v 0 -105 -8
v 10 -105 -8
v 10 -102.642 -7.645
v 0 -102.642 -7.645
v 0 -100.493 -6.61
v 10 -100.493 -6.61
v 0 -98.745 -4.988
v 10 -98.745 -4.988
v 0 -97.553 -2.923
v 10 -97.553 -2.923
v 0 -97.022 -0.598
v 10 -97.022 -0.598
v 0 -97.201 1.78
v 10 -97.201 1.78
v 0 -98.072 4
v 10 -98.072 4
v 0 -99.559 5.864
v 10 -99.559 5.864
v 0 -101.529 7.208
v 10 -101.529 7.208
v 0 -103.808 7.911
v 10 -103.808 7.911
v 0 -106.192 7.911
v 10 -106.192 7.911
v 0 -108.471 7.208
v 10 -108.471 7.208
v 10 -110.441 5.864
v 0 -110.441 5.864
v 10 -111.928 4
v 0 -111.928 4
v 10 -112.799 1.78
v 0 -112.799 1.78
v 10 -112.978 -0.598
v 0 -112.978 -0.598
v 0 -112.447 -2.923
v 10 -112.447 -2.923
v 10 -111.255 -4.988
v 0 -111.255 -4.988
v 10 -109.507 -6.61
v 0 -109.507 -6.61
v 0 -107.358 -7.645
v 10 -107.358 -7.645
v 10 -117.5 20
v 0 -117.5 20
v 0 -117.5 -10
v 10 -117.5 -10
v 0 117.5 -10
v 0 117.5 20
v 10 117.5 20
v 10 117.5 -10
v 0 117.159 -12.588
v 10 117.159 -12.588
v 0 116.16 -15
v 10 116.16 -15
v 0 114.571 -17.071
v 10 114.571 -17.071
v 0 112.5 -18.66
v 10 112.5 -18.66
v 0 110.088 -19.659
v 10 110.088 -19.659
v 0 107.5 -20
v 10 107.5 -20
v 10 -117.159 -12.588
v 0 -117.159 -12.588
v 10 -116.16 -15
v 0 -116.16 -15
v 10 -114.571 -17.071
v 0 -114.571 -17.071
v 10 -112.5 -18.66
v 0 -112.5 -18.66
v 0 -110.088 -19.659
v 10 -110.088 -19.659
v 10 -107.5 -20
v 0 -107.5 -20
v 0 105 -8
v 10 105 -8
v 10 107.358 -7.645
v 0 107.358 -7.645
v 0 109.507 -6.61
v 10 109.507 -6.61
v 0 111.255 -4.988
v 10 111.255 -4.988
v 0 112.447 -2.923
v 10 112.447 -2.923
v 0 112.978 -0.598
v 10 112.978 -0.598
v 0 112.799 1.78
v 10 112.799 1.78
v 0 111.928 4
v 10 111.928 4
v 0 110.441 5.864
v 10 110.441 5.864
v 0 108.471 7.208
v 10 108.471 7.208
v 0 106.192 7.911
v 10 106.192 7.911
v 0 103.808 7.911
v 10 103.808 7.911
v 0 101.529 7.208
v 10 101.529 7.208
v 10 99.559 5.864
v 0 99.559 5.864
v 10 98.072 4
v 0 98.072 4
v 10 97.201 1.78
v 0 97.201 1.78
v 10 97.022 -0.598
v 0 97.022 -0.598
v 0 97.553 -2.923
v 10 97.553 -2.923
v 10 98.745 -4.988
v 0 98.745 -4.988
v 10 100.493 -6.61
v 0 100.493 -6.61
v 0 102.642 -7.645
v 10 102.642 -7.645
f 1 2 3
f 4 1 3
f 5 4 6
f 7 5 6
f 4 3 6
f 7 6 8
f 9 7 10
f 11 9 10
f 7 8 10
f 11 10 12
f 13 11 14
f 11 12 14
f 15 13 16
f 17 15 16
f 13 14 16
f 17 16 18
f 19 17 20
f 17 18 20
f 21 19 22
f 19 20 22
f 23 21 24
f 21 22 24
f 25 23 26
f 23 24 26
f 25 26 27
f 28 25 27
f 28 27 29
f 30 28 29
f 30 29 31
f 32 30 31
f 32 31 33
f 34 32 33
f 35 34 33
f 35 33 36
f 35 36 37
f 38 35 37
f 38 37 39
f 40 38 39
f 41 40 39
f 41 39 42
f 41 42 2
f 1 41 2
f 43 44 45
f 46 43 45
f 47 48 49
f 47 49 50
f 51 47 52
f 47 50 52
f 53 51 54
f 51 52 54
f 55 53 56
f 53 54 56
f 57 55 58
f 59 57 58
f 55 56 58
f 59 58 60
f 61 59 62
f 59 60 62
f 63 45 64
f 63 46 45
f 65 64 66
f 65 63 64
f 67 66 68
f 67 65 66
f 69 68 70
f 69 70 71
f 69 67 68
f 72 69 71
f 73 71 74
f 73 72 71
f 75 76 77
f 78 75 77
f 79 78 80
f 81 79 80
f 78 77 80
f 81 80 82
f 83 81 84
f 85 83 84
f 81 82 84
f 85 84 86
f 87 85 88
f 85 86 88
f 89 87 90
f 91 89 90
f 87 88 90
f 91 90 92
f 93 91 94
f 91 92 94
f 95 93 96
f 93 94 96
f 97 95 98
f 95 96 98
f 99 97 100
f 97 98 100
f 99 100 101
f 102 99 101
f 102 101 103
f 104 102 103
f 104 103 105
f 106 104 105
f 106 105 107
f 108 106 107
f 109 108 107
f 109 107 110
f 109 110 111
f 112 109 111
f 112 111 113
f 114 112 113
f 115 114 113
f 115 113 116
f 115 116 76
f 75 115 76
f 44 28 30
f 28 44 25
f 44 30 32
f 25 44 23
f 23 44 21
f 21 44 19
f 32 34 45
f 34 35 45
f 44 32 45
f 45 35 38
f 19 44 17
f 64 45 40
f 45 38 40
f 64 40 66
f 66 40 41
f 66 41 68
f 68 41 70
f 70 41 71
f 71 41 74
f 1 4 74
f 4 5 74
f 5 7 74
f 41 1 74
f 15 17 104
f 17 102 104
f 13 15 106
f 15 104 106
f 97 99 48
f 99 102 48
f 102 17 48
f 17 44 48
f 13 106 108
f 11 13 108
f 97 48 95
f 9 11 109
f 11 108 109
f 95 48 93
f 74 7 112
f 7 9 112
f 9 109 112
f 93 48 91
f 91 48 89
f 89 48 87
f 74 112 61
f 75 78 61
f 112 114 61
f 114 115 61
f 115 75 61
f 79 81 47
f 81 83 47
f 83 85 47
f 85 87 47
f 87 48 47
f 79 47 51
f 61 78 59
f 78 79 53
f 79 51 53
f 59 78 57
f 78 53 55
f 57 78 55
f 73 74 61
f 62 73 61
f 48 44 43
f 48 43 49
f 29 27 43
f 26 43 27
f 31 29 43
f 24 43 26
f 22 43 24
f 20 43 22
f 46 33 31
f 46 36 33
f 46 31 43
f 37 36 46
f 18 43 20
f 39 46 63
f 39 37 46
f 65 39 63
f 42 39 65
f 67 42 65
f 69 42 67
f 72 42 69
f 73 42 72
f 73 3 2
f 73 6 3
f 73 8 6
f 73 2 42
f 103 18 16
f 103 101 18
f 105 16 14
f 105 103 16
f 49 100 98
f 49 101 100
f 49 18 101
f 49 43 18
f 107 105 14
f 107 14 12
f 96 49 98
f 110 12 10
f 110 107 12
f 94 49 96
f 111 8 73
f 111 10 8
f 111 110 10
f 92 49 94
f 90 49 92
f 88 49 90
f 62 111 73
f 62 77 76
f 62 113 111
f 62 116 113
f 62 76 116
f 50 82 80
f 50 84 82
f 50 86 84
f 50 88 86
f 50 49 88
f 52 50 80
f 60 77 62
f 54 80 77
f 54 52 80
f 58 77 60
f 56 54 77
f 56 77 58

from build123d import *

# Parameters (mm, degrees)
SKIZZE1_W                       = 40
SKIZZE1_H                       = 235
AUFSATZ_LINEAR_AUSTRAGEN1_DEPTH = 10
SKIZZE2_R                       = 8
SCHNITT_LINEAR_AUSTRAGEN1_DEPTH = 120.608737139
VERRUNDUNG1_R                   = 10


with BuildPart() as part:
    # Skizze1 → Aufsatz-Linear austragen1 (new body)
    with BuildSketch(Plane(origin=(0, 0, 0), x_dir=(0, 0, -1), z_dir=(1, 0, 0))):
        Rectangle(SKIZZE1_W, SKIZZE1_H)
    extrude(amount=AUFSATZ_LINEAR_AUSTRAGEN1_DEPTH)

    # Skizze2 → Schnitt-Linear austragen1 (cut, through all)
    with BuildSketch(Plane(origin=(10, 0, 0), x_dir=(0, 0, -1), z_dir=(1, 0, 0))):
        with Locations((0, 105)):
            Circle(SKIZZE2_R)
        with Locations((0, -105)):
            Circle(SKIZZE2_R)
    extrude(amount=-SCHNITT_LINEAR_AUSTRAGEN1_DEPTH, mode=Mode.SUBTRACT)

    # Verrundung1
    verrundung1_edges = [part.edges().sort_by_distance(p)[0] for p in [
        (5, -117.5, -20),
        (5, 117.5, -20),
    ]]
    fillet(verrundung1_edges, radius=VERRUNDUNG1_R)


solid = part.part
